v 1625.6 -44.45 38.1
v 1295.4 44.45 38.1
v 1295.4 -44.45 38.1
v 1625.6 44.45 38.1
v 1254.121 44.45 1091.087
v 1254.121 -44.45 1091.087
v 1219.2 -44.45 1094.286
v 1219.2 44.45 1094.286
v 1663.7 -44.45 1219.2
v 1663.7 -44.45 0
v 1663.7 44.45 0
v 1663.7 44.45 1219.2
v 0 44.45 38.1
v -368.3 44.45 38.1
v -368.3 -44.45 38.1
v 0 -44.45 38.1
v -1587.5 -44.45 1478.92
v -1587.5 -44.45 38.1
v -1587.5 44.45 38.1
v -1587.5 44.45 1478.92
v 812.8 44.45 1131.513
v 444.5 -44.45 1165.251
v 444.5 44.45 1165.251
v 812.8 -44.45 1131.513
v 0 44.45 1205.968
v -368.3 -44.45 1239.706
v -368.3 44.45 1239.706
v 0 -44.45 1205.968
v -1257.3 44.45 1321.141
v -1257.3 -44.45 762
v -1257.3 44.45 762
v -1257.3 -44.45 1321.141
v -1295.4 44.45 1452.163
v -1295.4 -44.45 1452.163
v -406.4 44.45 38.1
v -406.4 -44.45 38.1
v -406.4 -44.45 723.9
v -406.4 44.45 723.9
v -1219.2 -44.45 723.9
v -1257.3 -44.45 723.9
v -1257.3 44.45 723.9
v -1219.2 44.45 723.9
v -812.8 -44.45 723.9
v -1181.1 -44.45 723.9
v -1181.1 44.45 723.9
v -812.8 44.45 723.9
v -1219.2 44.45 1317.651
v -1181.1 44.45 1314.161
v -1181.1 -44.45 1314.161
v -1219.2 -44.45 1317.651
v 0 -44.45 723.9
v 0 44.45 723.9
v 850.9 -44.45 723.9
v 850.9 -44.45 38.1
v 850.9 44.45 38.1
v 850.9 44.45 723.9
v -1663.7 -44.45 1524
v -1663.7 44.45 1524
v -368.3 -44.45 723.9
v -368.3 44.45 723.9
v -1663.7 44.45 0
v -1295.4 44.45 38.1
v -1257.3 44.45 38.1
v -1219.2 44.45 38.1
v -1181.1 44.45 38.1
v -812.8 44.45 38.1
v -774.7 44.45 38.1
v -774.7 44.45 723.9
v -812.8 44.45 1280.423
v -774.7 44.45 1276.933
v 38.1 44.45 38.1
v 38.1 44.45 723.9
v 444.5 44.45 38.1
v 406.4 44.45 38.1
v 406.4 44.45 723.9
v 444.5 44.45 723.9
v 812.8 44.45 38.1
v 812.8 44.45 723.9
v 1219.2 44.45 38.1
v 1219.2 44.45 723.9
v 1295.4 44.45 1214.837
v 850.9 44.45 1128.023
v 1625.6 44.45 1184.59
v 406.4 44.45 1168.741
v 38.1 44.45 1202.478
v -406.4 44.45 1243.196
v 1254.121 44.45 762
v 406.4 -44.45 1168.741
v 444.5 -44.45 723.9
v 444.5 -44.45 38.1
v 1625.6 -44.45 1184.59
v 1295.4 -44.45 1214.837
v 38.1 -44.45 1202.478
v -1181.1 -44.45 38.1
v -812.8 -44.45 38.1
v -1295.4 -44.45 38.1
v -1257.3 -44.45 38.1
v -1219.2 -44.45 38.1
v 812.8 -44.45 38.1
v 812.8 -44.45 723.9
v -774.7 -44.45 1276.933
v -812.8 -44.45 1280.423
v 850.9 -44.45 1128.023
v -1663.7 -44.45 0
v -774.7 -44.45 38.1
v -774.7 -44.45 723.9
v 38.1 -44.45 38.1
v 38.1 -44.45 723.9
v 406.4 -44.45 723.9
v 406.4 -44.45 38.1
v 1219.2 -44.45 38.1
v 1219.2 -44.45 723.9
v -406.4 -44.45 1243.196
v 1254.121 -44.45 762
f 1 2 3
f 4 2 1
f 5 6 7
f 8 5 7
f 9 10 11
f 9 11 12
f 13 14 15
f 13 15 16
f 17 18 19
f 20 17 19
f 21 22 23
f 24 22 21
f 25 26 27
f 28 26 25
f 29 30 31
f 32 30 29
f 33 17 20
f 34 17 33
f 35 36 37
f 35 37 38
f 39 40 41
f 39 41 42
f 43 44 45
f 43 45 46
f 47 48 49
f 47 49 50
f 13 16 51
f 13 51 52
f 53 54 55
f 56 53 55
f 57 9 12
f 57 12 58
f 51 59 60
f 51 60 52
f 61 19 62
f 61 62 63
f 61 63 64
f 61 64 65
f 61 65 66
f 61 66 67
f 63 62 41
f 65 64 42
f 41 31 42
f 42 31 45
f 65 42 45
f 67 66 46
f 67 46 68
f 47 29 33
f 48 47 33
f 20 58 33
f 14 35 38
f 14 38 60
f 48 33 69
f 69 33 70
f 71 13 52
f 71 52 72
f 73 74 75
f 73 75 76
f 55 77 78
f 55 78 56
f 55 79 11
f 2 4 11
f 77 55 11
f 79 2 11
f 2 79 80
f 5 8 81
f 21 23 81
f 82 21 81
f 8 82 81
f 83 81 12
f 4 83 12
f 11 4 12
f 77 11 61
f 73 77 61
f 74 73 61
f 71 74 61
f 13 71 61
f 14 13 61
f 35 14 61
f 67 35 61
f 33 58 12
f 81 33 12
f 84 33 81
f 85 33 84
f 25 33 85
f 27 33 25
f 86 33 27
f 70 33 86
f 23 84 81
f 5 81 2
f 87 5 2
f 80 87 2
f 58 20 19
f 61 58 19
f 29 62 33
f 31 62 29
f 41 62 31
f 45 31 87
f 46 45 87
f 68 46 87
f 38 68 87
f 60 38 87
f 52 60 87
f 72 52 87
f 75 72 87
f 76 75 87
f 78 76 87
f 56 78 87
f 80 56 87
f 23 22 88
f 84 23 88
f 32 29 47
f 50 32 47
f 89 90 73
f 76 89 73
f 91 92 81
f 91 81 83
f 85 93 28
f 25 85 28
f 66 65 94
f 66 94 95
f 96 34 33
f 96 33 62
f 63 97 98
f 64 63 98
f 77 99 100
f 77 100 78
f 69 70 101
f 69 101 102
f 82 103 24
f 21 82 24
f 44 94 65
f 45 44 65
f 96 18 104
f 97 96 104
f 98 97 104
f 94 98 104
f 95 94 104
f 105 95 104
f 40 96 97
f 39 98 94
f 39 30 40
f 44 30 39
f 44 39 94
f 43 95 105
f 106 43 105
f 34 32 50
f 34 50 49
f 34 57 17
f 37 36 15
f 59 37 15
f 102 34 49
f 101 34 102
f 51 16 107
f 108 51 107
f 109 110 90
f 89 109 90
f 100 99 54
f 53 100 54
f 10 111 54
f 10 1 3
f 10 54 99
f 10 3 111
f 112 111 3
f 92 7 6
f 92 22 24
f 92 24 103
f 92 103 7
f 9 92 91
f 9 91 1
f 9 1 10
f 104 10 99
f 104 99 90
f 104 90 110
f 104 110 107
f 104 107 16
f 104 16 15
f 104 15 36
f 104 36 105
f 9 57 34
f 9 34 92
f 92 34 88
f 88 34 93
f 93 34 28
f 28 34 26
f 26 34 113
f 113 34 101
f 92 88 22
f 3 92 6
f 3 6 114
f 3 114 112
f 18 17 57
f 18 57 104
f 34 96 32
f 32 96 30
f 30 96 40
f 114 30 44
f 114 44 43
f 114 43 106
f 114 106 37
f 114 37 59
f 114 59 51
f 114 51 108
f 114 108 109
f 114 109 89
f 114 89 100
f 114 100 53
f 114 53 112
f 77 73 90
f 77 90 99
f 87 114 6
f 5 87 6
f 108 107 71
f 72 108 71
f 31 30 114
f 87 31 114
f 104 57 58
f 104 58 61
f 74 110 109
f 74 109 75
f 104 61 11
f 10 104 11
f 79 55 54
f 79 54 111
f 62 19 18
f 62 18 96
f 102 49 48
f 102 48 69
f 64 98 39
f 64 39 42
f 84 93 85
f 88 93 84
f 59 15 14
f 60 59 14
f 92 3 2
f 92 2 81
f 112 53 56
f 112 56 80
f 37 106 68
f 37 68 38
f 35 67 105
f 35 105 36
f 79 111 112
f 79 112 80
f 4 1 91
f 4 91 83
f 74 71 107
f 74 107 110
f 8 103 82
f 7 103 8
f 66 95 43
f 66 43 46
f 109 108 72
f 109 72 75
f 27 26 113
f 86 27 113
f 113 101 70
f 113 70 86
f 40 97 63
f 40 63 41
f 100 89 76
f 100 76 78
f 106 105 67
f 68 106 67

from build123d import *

# Parameters (mm, degrees)
F0_W      = 3327.4
F0_H      = 88.9
F1_DEPTH  = 38.1
F2_W      = 38.1
F2_H      = 88.9
F3_DEPTH  = 1524
F5_DEPTH  = 431.8
F7_DEPTH  = 88.9
F8_W      = 2514.6
F8_H      = 38.1
F9_DEPTH  = 88.9
F11_DEPTH = 330.2


with BuildPart() as f1:
    # F0 (on Top) → F1 (new body)
    with BuildSketch(Plane.XY):
        Rectangle(F0_W, F0_H)
    extrude(amount=F1_DEPTH)

    # F2 (on face) → F3 (join)
    with BuildSketch(Plane.XY.offset(38.1)):
        with Locations((1644.65, 0)):
            Rectangle(F2_W, F2_H)
        with Locations((1238.25, 0)):
            Rectangle(F2_W, F2_H)
        with Locations((831.85, 0)):
            Rectangle(F2_W, F2_H)
        with Locations((425.45, 0)):
            Rectangle(F2_W, F2_H)
        with Locations((19.05, 0)):
            Rectangle(F2_W, F2_H)
        with Locations((-387.35, 0)):
            Rectangle(F2_W, F2_H)
        with Locations((-793.75, 0)):
            Rectangle(F2_W, F2_H)
        with Locations((-1200.15, 0)):
            Rectangle(F2_W, F2_H)
        with Locations((-1644.65, 0)):
            Rectangle(F2_W, F2_H)
        with Locations((-1606.55, 0)):
            Rectangle(F2_W, F2_H)
    extrude(amount=F3_DEPTH)

    # F4 (on face) → F5 (cut)
    with BuildSketch(Plane.XZ.offset(44.45)):
        Polygon((-1823.165178, 1997.775987), (-1663.7, 1485.9), (1663.7, 1181.1), (1733.675979, 1945.004437), align=None)
    extrude(amount=-F5_DEPTH, mode=Mode.SUBTRACT)

    # F6 (on face) → F7 (join)
    with BuildSketch(Plane.XZ.offset(44.45)):
        Polygon((-1663.7, 1524), (-1663.7, 1485.9), (1663.7, 1181.1), (1663.7, 1219.2), align=None)
    extrude(amount=-F7_DEPTH)

    # F8 (on face) → F9 (join)
    with BuildSketch(Plane.XZ.offset(44.45)):
        Polygon((-1257.3, 723.9), (-1257.3, 762), (-1257.3, 1321.140796), (-1257.3, 1452.162595), (-1295.4, 1452.162595), (-1295.4, 38.1), (-1257.3, 38.1), align=None)
        with Locations((0, 742.95)):
            Rectangle(F8_W, F8_H)
        Polygon((1257.3, 1090.795758), (1257.3, 762), (1257.3, 723.9), (1257.3, 38.1), (1295.4, 38.1), (1295.4, 1218.327481), (1257.3, 1218.327481), align=None)
        Polygon((-1257.3, 1452.162595), (-1257.3, 1321.140796), (1257.3, 1090.795758), (1257.3, 1218.327481), align=None)
    extrude(amount=-F9_DEPTH)

    # F10 (on face) → F11 (cut)
    with BuildSketch(Plane.XZ.offset(44.45)):
        Polygon((-1257.3, 1321.140796), (-1257.3, 762), (1254.120588, 762), (1254.120588, 1091.087002), align=None)
    extrude(amount=-F11_DEPTH, mode=Mode.SUBTRACT)


solid = f1.part
